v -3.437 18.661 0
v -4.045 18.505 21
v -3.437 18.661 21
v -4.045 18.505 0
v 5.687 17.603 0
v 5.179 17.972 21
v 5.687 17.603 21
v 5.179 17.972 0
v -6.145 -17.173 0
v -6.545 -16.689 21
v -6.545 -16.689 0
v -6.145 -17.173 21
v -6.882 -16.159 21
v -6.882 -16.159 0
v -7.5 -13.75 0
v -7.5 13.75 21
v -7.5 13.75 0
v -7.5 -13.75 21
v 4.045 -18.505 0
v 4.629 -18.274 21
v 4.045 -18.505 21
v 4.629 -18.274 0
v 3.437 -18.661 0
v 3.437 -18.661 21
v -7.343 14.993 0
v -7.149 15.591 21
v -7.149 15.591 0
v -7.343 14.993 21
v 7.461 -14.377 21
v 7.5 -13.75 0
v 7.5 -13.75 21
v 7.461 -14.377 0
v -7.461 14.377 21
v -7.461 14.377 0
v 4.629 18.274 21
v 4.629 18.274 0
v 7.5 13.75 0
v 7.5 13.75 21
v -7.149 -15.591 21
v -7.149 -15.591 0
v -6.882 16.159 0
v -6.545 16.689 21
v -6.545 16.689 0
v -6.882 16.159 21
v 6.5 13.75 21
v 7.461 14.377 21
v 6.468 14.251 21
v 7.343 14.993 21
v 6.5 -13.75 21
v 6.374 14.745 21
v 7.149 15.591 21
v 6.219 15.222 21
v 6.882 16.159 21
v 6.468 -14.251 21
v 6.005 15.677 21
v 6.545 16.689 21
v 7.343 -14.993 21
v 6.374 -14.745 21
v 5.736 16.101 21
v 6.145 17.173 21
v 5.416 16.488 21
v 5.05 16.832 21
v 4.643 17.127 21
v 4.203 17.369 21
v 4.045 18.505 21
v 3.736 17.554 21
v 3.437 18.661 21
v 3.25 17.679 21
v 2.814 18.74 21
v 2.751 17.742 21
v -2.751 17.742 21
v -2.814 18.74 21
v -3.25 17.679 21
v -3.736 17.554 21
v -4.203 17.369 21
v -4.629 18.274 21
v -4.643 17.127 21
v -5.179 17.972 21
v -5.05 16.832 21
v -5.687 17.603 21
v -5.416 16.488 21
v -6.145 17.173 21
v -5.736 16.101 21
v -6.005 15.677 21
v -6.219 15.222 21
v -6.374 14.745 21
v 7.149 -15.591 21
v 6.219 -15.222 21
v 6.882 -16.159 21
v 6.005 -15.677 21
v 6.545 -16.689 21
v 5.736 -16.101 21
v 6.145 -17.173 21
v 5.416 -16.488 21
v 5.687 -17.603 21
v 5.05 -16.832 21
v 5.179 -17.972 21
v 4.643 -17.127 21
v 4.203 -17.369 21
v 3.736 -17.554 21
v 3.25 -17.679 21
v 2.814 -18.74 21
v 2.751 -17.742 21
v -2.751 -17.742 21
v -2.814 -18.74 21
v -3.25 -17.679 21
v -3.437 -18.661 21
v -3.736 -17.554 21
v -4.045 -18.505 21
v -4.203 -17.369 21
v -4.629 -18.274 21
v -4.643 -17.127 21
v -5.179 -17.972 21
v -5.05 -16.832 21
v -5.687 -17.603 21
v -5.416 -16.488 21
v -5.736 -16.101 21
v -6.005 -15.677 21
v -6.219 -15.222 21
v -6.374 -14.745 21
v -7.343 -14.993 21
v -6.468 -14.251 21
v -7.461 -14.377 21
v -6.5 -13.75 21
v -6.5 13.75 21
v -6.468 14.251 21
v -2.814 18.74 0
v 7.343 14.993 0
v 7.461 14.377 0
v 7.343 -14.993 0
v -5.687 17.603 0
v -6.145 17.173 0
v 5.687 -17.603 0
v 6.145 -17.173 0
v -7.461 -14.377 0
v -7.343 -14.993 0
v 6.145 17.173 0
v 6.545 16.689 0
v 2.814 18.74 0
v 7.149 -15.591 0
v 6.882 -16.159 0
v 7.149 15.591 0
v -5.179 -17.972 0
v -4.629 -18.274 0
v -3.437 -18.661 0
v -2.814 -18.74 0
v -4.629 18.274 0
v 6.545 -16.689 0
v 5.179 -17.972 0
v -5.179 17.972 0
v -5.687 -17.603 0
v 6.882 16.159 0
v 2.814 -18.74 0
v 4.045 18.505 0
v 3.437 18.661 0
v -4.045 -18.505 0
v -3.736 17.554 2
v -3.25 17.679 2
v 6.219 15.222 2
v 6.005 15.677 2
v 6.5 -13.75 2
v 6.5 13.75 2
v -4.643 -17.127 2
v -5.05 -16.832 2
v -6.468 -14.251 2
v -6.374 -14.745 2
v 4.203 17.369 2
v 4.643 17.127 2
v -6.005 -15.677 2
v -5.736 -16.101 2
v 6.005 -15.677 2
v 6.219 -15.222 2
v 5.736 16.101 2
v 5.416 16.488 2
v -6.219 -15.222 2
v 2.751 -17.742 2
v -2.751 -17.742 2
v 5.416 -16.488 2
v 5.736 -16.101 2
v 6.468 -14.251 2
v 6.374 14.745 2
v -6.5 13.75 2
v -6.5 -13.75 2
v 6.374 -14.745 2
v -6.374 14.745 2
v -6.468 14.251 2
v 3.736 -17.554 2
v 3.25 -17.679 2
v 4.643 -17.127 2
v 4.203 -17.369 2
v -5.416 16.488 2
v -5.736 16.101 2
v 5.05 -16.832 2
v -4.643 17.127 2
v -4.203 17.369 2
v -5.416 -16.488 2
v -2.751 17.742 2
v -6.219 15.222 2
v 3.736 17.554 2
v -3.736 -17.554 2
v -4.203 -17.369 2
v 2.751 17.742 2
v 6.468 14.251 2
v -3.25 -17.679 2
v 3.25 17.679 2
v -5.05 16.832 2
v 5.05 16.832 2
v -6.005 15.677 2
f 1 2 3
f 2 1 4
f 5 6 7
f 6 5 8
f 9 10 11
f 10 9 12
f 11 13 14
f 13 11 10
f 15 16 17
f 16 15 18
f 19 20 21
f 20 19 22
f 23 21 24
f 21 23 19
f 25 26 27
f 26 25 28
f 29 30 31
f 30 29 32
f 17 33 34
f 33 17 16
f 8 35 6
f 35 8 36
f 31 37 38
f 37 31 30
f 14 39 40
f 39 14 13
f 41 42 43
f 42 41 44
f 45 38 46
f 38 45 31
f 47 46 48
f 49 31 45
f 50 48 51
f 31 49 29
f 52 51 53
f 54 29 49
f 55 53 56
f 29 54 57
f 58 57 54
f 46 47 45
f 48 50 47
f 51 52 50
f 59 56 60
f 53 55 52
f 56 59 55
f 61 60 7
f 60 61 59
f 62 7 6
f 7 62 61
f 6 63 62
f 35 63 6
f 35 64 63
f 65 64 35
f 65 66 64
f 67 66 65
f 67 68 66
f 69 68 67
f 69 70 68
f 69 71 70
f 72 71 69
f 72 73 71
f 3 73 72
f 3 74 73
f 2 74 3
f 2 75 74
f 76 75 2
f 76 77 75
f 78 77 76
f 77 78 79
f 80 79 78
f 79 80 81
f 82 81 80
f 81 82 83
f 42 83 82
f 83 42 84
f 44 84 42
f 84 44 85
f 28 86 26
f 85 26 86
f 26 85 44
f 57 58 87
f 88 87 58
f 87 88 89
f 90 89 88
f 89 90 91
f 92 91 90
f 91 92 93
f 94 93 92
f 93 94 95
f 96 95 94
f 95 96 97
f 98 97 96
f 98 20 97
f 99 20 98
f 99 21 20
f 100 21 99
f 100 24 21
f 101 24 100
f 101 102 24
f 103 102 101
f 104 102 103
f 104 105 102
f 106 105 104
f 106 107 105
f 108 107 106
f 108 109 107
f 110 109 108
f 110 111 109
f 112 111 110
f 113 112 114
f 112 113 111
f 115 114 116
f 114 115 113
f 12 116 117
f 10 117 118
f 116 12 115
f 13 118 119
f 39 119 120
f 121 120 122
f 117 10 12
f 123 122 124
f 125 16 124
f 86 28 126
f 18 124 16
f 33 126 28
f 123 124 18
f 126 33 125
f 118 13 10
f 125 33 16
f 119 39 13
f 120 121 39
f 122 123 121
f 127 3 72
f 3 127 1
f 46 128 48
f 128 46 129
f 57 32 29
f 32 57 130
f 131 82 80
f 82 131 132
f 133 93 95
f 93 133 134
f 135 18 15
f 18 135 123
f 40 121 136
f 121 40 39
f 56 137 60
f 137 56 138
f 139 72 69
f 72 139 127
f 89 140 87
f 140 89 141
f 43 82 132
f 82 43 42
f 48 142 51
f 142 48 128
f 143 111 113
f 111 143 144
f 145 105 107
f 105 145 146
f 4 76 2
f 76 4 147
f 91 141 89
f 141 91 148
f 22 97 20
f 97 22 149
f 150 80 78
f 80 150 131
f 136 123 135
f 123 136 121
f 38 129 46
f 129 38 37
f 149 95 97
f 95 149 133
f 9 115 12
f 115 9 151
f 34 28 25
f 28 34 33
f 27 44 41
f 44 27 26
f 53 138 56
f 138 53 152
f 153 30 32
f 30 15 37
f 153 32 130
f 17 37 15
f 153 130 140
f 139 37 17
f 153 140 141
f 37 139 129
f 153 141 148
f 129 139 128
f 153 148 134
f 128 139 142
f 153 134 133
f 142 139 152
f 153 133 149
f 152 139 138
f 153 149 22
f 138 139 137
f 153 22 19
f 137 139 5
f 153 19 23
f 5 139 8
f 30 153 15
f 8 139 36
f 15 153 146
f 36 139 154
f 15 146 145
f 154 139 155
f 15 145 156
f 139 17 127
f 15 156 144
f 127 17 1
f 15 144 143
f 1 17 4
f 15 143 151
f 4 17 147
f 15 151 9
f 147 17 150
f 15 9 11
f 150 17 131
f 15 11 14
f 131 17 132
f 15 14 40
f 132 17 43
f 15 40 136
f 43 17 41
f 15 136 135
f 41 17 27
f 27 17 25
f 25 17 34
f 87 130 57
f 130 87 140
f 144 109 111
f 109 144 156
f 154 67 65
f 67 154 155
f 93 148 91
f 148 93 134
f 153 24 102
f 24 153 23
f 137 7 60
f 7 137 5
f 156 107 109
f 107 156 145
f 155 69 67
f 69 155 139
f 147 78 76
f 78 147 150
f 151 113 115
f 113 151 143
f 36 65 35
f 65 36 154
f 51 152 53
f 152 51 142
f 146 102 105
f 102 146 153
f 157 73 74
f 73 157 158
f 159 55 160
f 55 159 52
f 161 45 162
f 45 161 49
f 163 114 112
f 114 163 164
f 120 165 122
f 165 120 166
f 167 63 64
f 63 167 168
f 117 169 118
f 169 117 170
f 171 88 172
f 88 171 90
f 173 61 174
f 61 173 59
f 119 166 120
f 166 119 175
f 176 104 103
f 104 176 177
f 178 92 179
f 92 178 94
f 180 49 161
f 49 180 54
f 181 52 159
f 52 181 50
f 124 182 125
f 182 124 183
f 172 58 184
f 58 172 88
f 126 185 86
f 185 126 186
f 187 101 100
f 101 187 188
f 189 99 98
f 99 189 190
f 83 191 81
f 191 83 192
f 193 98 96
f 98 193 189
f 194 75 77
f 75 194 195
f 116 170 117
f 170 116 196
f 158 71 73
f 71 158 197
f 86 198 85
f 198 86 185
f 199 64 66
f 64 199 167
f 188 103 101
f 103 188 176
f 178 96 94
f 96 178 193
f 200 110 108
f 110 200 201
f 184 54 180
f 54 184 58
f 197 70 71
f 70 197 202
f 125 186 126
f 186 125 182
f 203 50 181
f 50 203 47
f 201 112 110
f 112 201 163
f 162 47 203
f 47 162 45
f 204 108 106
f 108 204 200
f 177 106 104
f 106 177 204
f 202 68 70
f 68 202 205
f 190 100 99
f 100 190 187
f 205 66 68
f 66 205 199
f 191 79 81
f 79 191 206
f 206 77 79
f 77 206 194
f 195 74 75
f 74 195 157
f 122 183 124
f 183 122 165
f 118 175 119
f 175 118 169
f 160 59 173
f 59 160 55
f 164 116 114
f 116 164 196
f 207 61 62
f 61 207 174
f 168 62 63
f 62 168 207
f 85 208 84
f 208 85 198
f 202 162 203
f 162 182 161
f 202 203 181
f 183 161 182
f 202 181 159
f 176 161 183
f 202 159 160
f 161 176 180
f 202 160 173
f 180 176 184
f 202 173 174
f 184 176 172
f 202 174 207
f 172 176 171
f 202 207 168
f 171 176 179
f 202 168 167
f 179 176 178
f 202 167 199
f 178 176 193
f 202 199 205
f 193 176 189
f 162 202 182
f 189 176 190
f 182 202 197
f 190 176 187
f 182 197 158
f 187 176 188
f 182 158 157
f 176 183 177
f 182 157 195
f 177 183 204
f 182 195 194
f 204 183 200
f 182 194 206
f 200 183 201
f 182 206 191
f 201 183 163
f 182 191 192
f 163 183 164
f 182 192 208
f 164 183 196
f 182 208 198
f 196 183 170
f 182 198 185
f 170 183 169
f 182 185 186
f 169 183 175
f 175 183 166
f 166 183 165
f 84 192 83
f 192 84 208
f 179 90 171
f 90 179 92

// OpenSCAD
$fn = 50;


difference() {
	union() {
		hull() {
			translate(v = [-2.5000000000, 13.7500000000, 0]) {
				cylinder(h = 21, r = 5);
			}
			translate(v = [2.5000000000, 13.7500000000, 0]) {
				cylinder(h = 21, r = 5);
			}
			translate(v = [-2.5000000000, -13.7500000000, 0]) {
				cylinder(h = 21, r = 5);
			}
			translate(v = [2.5000000000, -13.7500000000, 0]) {
				cylinder(h = 21, r = 5);
			}
		}
	}
	union() {
		translate(v = [0, 0, 2]) {
			hull() {
				translate(v = [-2.5000000000, 13.7500000000, 0]) {
					cylinder(h = 19, r = 4);
				}
				translate(v = [2.5000000000, 13.7500000000, 0]) {
					cylinder(h = 19, r = 4);
				}
				translate(v = [-2.5000000000, -13.7500000000, 0]) {
					cylinder(h = 19, r = 4);
				}
				translate(v = [2.5000000000, -13.7500000000, 0]) {
					cylinder(h = 19, r = 4);
				}
			}
		}
	}
}
